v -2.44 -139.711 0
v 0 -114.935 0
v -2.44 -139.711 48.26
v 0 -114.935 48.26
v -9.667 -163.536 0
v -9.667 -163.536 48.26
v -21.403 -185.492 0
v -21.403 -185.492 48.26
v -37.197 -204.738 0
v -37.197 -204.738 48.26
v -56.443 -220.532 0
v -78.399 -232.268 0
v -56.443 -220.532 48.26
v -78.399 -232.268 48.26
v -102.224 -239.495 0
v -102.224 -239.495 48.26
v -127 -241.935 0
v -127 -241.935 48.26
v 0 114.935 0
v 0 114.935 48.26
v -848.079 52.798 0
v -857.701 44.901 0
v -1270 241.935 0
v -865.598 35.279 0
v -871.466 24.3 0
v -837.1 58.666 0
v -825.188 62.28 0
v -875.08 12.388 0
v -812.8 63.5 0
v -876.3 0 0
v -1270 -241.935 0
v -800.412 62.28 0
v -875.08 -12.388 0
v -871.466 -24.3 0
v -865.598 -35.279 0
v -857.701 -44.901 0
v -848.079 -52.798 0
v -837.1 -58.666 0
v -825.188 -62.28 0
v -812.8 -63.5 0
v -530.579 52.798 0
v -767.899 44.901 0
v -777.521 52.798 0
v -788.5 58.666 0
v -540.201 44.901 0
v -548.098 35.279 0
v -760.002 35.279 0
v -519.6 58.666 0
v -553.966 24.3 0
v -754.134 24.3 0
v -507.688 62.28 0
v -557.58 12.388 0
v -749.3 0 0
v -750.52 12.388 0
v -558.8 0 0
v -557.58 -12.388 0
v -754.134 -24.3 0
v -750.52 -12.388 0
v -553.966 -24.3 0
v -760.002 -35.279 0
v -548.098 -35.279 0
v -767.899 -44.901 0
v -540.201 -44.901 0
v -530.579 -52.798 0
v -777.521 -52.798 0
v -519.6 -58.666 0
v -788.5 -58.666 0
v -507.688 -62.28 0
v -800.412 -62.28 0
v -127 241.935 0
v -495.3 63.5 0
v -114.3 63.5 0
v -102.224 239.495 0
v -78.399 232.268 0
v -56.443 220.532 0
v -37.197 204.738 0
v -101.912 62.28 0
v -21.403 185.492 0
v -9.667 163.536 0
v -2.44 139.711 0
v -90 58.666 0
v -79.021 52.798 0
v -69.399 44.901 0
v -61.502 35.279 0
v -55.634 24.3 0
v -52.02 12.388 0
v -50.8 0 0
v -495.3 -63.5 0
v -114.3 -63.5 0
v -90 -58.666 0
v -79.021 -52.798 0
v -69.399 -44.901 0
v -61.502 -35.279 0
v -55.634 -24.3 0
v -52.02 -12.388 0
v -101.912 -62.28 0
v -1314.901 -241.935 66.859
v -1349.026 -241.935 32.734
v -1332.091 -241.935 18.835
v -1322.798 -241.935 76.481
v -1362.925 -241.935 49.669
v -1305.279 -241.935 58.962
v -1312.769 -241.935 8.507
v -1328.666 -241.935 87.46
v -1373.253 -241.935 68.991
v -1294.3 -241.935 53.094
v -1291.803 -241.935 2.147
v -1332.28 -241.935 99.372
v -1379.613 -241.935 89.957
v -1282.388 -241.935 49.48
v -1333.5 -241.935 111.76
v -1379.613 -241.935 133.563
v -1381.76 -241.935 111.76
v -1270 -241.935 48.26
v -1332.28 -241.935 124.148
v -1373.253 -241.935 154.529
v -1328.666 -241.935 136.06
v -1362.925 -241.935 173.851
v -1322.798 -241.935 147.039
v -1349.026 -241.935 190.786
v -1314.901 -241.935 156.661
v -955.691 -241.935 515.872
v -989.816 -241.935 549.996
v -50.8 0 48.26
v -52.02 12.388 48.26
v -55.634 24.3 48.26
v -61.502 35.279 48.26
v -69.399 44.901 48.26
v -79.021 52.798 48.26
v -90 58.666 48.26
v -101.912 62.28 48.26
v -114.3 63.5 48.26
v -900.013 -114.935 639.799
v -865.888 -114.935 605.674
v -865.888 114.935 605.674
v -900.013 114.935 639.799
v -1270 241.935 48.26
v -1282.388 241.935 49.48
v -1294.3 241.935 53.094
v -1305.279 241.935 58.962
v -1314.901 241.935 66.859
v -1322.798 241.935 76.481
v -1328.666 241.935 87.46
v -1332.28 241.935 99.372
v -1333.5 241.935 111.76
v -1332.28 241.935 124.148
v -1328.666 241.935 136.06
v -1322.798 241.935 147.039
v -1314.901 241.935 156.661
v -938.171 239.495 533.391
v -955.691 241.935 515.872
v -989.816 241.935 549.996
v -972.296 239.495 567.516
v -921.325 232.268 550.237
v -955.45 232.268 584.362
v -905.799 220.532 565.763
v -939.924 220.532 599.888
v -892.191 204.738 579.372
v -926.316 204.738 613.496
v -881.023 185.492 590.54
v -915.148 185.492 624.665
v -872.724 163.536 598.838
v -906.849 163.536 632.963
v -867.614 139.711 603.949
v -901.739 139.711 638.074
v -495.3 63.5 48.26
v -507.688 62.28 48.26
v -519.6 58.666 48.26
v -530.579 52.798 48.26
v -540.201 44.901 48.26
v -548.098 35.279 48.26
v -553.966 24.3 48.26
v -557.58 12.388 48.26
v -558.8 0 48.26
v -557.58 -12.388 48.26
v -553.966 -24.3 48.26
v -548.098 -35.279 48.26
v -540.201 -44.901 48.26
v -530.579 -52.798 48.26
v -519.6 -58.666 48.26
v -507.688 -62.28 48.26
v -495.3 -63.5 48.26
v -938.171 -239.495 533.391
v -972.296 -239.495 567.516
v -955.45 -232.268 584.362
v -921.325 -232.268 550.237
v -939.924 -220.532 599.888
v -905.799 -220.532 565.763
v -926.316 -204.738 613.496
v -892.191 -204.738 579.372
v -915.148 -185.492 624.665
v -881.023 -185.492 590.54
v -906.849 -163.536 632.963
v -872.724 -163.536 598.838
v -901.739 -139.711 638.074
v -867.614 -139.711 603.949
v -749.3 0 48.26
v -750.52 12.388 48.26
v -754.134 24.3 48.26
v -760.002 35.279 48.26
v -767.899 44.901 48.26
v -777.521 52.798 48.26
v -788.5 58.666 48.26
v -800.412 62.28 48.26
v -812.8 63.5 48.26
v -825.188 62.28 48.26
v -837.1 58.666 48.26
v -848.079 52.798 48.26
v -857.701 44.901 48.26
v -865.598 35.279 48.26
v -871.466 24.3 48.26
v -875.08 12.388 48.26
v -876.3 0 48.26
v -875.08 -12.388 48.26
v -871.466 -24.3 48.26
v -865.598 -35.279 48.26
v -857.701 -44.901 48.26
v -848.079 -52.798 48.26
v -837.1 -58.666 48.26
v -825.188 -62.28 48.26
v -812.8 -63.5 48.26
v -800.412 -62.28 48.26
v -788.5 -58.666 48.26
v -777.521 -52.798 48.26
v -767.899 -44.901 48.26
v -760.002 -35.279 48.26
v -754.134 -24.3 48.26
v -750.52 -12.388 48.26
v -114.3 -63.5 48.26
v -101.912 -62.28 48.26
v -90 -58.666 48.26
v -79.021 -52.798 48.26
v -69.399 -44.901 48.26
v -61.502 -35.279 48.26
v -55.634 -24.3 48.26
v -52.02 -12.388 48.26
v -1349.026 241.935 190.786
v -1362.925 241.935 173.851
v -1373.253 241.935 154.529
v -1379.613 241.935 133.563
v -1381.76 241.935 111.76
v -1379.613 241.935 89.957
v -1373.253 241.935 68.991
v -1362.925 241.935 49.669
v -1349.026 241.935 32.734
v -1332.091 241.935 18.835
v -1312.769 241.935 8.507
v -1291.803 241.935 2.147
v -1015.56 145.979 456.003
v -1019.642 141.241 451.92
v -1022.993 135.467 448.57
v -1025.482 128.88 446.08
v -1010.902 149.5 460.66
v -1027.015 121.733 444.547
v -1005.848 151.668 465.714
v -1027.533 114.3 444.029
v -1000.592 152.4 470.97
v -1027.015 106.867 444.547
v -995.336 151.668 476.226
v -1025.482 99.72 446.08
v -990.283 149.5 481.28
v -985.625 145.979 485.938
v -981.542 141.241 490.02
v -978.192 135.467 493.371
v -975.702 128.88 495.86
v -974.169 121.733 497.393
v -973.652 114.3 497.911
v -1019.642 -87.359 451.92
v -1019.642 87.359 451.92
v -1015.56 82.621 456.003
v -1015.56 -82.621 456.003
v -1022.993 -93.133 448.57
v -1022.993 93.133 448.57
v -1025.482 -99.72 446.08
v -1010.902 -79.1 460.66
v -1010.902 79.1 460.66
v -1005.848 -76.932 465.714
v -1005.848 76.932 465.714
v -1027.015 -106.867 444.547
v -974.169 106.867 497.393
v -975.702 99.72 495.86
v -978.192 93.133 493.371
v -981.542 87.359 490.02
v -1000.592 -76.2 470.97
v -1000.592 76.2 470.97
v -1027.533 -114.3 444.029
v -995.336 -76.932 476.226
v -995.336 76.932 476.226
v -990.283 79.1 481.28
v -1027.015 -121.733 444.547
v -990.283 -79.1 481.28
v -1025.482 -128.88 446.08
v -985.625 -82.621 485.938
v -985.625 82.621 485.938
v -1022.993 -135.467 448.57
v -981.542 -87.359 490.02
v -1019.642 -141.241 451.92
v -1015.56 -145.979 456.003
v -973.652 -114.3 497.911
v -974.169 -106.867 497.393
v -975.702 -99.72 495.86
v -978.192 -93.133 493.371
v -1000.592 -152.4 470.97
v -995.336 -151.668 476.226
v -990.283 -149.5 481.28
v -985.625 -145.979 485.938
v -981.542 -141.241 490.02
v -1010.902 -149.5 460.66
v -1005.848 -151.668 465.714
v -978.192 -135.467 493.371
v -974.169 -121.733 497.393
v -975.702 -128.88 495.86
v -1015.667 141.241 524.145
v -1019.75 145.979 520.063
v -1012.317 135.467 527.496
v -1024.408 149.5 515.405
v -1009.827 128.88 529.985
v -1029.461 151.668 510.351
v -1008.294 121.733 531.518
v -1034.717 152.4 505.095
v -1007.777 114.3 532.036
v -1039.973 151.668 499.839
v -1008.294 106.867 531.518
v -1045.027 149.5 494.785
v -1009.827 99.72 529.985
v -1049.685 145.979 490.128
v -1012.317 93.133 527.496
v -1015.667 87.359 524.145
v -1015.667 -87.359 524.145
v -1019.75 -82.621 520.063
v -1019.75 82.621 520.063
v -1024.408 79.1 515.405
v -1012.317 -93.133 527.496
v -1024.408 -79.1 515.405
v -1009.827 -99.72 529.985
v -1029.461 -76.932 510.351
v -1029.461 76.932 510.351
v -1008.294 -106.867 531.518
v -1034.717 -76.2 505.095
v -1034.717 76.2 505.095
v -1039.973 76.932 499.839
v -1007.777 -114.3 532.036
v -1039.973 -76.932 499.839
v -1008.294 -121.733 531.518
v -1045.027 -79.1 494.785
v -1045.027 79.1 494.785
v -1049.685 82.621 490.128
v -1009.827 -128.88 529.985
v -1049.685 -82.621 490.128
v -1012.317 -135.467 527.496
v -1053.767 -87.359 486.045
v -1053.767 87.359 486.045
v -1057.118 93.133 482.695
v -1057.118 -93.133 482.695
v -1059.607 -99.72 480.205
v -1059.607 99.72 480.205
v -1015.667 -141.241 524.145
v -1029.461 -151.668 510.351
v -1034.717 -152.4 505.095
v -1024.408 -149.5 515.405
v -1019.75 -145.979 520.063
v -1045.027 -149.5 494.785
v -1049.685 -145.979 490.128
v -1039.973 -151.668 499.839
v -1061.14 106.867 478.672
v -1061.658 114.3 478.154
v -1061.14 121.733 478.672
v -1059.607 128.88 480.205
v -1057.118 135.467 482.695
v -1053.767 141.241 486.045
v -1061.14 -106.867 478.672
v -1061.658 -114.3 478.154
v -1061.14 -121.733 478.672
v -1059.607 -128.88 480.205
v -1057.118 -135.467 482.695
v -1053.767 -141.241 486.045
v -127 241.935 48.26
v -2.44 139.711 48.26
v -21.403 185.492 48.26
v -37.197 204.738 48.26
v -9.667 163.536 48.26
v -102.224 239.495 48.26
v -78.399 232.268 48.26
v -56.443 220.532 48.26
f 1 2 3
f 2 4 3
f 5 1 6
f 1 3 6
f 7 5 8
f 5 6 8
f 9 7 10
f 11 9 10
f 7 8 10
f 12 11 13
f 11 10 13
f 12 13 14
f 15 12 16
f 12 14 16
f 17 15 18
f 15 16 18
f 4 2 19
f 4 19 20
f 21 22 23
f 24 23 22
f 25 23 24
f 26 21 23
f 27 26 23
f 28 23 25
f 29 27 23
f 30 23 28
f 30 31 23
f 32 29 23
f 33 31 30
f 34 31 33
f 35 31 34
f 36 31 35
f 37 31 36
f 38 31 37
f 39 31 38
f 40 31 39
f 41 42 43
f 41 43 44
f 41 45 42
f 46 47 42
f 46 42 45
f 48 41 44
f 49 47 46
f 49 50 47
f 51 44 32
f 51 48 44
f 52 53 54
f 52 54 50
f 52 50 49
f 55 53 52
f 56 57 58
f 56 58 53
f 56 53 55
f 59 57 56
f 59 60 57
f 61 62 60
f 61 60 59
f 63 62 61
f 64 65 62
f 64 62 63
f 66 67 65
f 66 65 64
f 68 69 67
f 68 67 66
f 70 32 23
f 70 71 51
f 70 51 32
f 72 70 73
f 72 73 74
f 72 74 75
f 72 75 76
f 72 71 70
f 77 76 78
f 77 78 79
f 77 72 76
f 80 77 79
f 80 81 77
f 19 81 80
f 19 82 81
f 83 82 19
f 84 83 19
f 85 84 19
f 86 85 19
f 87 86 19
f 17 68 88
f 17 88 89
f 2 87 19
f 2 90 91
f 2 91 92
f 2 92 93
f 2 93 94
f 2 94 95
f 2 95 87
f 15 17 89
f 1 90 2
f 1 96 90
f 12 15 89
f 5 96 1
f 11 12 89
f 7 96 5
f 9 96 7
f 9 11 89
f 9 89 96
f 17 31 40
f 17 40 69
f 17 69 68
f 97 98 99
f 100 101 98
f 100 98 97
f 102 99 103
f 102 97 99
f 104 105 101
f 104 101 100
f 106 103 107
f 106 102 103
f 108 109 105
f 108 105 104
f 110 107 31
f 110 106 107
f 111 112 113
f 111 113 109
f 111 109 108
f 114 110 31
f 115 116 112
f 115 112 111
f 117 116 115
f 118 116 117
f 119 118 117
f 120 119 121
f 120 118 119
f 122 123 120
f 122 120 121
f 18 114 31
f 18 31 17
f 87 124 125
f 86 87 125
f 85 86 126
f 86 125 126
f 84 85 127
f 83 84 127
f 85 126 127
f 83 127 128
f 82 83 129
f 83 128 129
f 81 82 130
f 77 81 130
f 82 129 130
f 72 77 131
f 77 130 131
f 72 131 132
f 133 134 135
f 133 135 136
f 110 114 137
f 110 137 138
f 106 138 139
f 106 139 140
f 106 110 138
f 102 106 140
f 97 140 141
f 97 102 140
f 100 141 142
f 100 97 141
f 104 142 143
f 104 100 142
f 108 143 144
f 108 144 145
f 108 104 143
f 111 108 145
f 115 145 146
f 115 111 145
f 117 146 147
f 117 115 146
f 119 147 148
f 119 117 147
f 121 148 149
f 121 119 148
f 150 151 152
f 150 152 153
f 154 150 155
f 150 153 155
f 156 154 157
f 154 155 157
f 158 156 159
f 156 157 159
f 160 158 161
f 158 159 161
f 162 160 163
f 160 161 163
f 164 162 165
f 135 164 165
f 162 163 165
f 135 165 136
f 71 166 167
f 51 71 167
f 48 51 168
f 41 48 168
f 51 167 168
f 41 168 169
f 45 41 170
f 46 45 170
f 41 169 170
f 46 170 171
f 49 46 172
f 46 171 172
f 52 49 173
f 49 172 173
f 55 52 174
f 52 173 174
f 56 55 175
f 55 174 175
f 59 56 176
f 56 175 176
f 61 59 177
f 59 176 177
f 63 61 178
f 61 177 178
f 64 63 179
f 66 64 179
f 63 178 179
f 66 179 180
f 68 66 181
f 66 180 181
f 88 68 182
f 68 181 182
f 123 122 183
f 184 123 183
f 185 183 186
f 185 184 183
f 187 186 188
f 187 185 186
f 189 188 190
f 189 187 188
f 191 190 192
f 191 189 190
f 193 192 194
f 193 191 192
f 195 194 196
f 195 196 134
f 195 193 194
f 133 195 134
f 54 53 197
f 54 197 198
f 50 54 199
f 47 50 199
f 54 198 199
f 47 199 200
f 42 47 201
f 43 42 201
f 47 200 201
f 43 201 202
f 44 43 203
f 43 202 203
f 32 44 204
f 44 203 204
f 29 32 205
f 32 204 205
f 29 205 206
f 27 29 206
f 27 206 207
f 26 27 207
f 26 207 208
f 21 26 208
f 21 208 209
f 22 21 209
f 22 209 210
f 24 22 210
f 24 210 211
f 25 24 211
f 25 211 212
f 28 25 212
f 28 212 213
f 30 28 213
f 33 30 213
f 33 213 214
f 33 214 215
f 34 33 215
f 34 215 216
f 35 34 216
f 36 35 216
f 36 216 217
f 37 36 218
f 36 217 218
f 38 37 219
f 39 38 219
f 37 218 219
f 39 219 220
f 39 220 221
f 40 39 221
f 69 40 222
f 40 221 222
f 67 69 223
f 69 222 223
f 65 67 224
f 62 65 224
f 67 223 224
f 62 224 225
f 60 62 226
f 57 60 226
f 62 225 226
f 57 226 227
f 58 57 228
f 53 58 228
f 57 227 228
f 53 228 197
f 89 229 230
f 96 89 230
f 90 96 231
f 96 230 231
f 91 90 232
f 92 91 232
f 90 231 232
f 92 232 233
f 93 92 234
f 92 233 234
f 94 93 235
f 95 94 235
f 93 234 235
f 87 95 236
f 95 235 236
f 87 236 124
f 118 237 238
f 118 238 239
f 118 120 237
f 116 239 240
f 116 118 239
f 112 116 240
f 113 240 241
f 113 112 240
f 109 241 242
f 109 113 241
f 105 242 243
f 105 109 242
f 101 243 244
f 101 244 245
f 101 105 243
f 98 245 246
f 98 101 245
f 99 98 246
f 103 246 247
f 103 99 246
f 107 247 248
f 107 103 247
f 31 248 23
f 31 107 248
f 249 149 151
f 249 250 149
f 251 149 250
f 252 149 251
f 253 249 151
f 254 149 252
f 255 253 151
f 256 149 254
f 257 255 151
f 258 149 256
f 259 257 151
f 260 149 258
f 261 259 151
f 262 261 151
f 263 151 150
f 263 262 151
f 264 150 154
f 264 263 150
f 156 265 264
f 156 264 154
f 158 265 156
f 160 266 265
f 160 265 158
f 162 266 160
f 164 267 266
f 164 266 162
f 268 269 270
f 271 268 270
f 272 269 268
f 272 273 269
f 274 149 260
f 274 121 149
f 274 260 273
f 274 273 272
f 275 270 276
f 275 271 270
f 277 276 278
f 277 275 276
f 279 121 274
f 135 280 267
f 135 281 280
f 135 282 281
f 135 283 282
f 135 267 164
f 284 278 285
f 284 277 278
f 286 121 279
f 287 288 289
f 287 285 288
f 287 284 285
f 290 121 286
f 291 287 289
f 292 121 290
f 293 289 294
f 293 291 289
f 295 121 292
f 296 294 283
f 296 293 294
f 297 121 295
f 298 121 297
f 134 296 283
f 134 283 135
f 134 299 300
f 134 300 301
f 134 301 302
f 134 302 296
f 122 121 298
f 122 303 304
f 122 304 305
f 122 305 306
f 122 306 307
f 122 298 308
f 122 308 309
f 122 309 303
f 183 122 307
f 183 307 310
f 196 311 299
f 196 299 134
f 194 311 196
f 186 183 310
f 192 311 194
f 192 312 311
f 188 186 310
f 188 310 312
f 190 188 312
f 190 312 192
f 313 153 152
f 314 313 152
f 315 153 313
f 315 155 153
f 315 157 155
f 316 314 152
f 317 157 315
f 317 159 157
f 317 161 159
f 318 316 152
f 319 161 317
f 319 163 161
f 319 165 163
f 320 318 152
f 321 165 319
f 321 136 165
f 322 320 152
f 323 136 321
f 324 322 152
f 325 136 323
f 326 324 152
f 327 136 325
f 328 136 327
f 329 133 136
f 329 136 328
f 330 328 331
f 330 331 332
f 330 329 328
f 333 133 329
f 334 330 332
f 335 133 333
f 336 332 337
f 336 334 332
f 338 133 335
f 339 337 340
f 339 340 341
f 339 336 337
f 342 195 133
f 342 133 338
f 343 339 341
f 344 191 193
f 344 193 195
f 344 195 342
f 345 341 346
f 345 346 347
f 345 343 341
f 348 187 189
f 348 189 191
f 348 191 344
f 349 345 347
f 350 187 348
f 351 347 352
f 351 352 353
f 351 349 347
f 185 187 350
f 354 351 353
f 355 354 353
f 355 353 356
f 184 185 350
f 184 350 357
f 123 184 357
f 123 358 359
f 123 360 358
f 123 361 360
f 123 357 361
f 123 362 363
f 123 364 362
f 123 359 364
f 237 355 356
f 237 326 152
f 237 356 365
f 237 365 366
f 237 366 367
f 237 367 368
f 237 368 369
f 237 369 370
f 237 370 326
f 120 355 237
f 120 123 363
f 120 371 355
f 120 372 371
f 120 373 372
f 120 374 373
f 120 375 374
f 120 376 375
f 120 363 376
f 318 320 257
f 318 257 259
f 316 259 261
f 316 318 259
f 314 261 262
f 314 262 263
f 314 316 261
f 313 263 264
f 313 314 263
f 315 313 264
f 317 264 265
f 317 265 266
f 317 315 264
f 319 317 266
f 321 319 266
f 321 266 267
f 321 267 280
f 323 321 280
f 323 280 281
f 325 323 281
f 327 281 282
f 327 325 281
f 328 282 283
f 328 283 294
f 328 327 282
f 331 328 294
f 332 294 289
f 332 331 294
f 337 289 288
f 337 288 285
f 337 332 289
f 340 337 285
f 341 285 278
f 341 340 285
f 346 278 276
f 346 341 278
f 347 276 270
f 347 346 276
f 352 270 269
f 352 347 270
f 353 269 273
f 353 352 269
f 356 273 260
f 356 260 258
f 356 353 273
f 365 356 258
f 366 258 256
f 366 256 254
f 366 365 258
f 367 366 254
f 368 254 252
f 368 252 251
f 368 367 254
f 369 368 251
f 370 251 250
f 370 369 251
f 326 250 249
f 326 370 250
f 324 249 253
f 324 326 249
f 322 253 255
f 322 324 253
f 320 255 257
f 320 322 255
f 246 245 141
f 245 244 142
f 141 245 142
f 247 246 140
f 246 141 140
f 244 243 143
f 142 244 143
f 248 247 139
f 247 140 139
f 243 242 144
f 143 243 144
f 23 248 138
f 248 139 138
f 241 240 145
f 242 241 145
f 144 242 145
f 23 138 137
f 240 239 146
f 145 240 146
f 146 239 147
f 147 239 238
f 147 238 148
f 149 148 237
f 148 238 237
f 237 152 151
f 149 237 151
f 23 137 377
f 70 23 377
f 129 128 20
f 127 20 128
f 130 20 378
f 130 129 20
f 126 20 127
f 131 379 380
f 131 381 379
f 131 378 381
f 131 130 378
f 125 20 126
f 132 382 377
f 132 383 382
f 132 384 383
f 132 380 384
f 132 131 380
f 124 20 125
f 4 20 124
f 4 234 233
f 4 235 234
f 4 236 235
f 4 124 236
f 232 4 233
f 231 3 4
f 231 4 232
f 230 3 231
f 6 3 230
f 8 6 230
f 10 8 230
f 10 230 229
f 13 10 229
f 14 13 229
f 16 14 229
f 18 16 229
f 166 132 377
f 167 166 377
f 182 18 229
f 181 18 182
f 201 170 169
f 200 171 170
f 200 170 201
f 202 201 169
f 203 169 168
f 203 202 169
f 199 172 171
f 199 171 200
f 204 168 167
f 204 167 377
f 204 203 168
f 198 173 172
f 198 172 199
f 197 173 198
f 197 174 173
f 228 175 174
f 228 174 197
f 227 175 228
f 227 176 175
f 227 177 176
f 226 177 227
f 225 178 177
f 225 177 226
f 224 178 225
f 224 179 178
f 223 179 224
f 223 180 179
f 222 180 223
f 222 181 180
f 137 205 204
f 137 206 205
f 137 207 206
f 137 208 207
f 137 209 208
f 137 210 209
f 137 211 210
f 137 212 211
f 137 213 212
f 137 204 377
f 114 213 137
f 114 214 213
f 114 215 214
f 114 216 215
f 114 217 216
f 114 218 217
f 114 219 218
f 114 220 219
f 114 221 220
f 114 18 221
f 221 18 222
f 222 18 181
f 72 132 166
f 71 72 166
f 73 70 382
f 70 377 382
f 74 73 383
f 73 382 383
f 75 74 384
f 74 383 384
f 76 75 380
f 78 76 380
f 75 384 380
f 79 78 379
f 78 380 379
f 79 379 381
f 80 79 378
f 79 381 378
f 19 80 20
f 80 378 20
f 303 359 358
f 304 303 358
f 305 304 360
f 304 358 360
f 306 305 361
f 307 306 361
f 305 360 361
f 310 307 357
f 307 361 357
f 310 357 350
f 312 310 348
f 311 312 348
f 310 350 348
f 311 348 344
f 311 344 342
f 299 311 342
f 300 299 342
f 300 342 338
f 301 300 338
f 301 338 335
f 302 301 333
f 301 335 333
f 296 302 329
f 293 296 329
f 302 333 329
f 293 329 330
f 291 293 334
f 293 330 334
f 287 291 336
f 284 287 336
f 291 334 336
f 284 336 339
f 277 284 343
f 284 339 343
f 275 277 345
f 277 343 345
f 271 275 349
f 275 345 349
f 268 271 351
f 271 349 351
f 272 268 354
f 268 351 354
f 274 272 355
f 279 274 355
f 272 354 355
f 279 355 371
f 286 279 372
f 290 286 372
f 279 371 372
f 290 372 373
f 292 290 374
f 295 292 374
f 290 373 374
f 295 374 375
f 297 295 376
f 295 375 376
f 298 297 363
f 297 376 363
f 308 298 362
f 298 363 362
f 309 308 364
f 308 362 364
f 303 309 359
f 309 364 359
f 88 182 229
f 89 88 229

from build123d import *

# Parameters (mm, degrees)
F1_DEPTH = 241.935
F2_R     = 63.5
F3_DEPTH = 48.261
F4_R     = 38.1
F5_DEPTH = 48.26
F6_R     = 127
F7_R     = 127


# Not quite as in the source:
# - a pattern or mirror of a feature is missing from the dataset's text; its kind, count and spacing are read off the source's solid


with BuildPart() as f1:
    # F0 (on Front) → F1 (new body, symmetric)
    with BuildSketch(Plane.XZ):
        with BuildLine():
            Line((-1270, 0), (0, 0))
            Line((0, 0), (0, 48.26))
            Line((0, 48.26), (-1270, 48.26))
            ThreePointArc((-1270, 48.26), (-1328.6663503145, 87.4596020448), (-1314.9012806053, 156.6612806053))
            Line((-1314.9012806053, 156.6612806053), (-865.8884745519, 605.6740866588))
            Line((-865.8884745519, 605.6740866588), (-900.013447812, 639.7990599189))
            Line((-900.013447812, 639.7990599189), (-1349.0262538654, 190.7862538654))
            ThreePointArc((-1349.0262538654, 190.7862538654), (-1373.2527765535, 68.9912995989), (-1270, 0))
        make_face()
    extrude(amount=F1_DEPTH, both=True)

    # F2 (on face) → F3 (cut, through all)
    with BuildSketch(Plane.XY.offset(48.26)):
        with Locations((-812.8, 0)):
            Circle(F2_R)
        with BuildLine():
            ThreePointArc((-495.3, -63.5), (-450.3987193947, -44.9012806053), (-431.8, 0))
            ThreePointArc((-431.8, 0), (-450.3987193947, 44.9012806053), (-495.3, 63.5))
            ThreePointArc((-495.3, 63.5), (-558.8, 0), (-495.3, -63.5))
        make_face()
        with BuildLine():
            ThreePointArc((-495.3, 63.5), (-450.3987193947, 44.9012806053), (-431.8, 0))
            ThreePointArc((-431.8, 0), (-450.3987193947, -44.9012806053), (-495.3, -63.5))
            Line((-495.3, -63.5), (-114.3, -63.5))
            ThreePointArc((-114.3, -63.5), (-177.8, 0), (-114.3, 63.5))
            Line((-114.3, 63.5), (-495.3, 63.5))
        make_face()
        with BuildLine():
            ThreePointArc((-50.8, 0), (-69.3987193947, 44.9012806053), (-114.3, 63.5))
            ThreePointArc((-114.3, 63.5), (-177.8, 0), (-114.3, -63.5))
            ThreePointArc((-114.3, -63.5), (-69.3987193947, -44.9012806053), (-50.8, 0))
        make_face()
    extrude(amount=-F3_DEPTH, mode=Mode.SUBTRACT)

    # F4 (on face) → F5 (cut, through all)
    with BuildSketch(Plane(origin=(-769.9062538654, 0, 769.9062538654), x_dir=(0, -1, 0), z_dir=(-0.7071067812, 0, 0.7071067812))):
        with Locations((114.3, -374.4993582415)):
            Circle(F4_R)
    f5 = extrude(amount=-F5_DEPTH, mode=Mode.SUBTRACT)

    # F5_copies: F5 across plane
    add(f5.mirror(Plane.ZX), mode=Mode.SUBTRACT)

    # F6
    f6_edges = [f1.edges().sort_by_distance(p)[0] for p in [
        (-882.950961, 241.935, 622.736573),
        (-882.950961, -241.935, 622.736573),
    ]]
    fillet(f6_edges, radius=F6_R)

    # F7
    f7_edges = [f1.edges().sort_by_distance(p)[0] for p in [
        (0, 241.935, 24.13),
        (0, -241.935, 24.13),
    ]]
    fillet(f7_edges, radius=F7_R)


solid = f1.part
